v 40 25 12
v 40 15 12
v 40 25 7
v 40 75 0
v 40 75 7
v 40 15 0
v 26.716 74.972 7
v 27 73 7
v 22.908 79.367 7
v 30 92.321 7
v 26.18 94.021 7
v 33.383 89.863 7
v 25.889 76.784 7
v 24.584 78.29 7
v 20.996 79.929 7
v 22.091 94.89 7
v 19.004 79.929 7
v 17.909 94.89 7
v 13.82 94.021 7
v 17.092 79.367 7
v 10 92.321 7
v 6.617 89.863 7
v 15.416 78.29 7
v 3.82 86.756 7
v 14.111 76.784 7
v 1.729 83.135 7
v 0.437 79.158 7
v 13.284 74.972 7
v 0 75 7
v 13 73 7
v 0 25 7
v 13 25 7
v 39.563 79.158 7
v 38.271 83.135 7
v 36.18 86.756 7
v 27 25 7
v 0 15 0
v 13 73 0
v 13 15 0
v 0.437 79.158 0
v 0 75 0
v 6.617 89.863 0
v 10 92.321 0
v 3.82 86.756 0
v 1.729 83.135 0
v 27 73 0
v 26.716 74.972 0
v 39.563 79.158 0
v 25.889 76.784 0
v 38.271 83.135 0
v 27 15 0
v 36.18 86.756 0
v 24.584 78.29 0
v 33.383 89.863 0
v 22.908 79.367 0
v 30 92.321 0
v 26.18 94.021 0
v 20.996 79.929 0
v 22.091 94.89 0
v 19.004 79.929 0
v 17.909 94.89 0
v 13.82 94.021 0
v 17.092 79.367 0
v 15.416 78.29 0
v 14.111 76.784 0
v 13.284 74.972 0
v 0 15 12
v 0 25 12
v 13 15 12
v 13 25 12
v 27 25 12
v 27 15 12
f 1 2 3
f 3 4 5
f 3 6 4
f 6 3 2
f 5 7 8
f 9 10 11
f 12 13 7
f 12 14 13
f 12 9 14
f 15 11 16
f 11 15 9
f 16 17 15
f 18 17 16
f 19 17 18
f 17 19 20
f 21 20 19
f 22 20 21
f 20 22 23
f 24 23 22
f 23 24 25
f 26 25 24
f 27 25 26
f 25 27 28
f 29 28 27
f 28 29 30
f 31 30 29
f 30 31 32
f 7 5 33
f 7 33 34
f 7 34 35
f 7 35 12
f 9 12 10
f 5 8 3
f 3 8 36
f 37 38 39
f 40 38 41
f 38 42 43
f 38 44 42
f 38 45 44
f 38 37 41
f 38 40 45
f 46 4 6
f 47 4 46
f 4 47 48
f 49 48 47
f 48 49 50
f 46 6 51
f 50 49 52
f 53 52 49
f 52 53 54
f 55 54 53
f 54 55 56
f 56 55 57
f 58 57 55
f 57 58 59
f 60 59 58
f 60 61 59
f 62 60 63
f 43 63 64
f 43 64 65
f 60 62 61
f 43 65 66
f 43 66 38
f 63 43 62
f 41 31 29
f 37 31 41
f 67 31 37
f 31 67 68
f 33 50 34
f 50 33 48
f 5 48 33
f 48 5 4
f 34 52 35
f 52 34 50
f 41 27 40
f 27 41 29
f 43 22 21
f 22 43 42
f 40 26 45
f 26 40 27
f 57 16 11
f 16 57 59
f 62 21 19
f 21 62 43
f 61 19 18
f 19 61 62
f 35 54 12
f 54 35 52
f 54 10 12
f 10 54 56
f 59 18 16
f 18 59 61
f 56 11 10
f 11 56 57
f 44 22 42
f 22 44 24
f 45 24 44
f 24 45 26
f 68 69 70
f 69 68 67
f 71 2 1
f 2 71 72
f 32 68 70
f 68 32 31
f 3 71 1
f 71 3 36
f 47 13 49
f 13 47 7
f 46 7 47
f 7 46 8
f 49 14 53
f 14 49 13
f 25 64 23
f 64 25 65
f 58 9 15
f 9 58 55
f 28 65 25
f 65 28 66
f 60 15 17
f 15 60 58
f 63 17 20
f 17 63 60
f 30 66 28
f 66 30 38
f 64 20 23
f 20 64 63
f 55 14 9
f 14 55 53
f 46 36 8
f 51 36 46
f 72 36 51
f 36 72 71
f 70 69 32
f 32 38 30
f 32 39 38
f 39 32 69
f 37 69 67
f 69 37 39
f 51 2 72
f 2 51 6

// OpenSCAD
difference () {
	union() {
		cube([40,75,7]);
		translate([20,75,0]) rotate([0,0,0]) cylinder(r=20,h=7);
		cube([40,25,12]);
	}
translate([20,73,-1]) rotate([0,0,0]) cylinder(r=7,h=64);
translate([13,-1,-1]) cube([14,74,20]);
translate([-1,-1,-1]) cube([42,16,20]);
}
